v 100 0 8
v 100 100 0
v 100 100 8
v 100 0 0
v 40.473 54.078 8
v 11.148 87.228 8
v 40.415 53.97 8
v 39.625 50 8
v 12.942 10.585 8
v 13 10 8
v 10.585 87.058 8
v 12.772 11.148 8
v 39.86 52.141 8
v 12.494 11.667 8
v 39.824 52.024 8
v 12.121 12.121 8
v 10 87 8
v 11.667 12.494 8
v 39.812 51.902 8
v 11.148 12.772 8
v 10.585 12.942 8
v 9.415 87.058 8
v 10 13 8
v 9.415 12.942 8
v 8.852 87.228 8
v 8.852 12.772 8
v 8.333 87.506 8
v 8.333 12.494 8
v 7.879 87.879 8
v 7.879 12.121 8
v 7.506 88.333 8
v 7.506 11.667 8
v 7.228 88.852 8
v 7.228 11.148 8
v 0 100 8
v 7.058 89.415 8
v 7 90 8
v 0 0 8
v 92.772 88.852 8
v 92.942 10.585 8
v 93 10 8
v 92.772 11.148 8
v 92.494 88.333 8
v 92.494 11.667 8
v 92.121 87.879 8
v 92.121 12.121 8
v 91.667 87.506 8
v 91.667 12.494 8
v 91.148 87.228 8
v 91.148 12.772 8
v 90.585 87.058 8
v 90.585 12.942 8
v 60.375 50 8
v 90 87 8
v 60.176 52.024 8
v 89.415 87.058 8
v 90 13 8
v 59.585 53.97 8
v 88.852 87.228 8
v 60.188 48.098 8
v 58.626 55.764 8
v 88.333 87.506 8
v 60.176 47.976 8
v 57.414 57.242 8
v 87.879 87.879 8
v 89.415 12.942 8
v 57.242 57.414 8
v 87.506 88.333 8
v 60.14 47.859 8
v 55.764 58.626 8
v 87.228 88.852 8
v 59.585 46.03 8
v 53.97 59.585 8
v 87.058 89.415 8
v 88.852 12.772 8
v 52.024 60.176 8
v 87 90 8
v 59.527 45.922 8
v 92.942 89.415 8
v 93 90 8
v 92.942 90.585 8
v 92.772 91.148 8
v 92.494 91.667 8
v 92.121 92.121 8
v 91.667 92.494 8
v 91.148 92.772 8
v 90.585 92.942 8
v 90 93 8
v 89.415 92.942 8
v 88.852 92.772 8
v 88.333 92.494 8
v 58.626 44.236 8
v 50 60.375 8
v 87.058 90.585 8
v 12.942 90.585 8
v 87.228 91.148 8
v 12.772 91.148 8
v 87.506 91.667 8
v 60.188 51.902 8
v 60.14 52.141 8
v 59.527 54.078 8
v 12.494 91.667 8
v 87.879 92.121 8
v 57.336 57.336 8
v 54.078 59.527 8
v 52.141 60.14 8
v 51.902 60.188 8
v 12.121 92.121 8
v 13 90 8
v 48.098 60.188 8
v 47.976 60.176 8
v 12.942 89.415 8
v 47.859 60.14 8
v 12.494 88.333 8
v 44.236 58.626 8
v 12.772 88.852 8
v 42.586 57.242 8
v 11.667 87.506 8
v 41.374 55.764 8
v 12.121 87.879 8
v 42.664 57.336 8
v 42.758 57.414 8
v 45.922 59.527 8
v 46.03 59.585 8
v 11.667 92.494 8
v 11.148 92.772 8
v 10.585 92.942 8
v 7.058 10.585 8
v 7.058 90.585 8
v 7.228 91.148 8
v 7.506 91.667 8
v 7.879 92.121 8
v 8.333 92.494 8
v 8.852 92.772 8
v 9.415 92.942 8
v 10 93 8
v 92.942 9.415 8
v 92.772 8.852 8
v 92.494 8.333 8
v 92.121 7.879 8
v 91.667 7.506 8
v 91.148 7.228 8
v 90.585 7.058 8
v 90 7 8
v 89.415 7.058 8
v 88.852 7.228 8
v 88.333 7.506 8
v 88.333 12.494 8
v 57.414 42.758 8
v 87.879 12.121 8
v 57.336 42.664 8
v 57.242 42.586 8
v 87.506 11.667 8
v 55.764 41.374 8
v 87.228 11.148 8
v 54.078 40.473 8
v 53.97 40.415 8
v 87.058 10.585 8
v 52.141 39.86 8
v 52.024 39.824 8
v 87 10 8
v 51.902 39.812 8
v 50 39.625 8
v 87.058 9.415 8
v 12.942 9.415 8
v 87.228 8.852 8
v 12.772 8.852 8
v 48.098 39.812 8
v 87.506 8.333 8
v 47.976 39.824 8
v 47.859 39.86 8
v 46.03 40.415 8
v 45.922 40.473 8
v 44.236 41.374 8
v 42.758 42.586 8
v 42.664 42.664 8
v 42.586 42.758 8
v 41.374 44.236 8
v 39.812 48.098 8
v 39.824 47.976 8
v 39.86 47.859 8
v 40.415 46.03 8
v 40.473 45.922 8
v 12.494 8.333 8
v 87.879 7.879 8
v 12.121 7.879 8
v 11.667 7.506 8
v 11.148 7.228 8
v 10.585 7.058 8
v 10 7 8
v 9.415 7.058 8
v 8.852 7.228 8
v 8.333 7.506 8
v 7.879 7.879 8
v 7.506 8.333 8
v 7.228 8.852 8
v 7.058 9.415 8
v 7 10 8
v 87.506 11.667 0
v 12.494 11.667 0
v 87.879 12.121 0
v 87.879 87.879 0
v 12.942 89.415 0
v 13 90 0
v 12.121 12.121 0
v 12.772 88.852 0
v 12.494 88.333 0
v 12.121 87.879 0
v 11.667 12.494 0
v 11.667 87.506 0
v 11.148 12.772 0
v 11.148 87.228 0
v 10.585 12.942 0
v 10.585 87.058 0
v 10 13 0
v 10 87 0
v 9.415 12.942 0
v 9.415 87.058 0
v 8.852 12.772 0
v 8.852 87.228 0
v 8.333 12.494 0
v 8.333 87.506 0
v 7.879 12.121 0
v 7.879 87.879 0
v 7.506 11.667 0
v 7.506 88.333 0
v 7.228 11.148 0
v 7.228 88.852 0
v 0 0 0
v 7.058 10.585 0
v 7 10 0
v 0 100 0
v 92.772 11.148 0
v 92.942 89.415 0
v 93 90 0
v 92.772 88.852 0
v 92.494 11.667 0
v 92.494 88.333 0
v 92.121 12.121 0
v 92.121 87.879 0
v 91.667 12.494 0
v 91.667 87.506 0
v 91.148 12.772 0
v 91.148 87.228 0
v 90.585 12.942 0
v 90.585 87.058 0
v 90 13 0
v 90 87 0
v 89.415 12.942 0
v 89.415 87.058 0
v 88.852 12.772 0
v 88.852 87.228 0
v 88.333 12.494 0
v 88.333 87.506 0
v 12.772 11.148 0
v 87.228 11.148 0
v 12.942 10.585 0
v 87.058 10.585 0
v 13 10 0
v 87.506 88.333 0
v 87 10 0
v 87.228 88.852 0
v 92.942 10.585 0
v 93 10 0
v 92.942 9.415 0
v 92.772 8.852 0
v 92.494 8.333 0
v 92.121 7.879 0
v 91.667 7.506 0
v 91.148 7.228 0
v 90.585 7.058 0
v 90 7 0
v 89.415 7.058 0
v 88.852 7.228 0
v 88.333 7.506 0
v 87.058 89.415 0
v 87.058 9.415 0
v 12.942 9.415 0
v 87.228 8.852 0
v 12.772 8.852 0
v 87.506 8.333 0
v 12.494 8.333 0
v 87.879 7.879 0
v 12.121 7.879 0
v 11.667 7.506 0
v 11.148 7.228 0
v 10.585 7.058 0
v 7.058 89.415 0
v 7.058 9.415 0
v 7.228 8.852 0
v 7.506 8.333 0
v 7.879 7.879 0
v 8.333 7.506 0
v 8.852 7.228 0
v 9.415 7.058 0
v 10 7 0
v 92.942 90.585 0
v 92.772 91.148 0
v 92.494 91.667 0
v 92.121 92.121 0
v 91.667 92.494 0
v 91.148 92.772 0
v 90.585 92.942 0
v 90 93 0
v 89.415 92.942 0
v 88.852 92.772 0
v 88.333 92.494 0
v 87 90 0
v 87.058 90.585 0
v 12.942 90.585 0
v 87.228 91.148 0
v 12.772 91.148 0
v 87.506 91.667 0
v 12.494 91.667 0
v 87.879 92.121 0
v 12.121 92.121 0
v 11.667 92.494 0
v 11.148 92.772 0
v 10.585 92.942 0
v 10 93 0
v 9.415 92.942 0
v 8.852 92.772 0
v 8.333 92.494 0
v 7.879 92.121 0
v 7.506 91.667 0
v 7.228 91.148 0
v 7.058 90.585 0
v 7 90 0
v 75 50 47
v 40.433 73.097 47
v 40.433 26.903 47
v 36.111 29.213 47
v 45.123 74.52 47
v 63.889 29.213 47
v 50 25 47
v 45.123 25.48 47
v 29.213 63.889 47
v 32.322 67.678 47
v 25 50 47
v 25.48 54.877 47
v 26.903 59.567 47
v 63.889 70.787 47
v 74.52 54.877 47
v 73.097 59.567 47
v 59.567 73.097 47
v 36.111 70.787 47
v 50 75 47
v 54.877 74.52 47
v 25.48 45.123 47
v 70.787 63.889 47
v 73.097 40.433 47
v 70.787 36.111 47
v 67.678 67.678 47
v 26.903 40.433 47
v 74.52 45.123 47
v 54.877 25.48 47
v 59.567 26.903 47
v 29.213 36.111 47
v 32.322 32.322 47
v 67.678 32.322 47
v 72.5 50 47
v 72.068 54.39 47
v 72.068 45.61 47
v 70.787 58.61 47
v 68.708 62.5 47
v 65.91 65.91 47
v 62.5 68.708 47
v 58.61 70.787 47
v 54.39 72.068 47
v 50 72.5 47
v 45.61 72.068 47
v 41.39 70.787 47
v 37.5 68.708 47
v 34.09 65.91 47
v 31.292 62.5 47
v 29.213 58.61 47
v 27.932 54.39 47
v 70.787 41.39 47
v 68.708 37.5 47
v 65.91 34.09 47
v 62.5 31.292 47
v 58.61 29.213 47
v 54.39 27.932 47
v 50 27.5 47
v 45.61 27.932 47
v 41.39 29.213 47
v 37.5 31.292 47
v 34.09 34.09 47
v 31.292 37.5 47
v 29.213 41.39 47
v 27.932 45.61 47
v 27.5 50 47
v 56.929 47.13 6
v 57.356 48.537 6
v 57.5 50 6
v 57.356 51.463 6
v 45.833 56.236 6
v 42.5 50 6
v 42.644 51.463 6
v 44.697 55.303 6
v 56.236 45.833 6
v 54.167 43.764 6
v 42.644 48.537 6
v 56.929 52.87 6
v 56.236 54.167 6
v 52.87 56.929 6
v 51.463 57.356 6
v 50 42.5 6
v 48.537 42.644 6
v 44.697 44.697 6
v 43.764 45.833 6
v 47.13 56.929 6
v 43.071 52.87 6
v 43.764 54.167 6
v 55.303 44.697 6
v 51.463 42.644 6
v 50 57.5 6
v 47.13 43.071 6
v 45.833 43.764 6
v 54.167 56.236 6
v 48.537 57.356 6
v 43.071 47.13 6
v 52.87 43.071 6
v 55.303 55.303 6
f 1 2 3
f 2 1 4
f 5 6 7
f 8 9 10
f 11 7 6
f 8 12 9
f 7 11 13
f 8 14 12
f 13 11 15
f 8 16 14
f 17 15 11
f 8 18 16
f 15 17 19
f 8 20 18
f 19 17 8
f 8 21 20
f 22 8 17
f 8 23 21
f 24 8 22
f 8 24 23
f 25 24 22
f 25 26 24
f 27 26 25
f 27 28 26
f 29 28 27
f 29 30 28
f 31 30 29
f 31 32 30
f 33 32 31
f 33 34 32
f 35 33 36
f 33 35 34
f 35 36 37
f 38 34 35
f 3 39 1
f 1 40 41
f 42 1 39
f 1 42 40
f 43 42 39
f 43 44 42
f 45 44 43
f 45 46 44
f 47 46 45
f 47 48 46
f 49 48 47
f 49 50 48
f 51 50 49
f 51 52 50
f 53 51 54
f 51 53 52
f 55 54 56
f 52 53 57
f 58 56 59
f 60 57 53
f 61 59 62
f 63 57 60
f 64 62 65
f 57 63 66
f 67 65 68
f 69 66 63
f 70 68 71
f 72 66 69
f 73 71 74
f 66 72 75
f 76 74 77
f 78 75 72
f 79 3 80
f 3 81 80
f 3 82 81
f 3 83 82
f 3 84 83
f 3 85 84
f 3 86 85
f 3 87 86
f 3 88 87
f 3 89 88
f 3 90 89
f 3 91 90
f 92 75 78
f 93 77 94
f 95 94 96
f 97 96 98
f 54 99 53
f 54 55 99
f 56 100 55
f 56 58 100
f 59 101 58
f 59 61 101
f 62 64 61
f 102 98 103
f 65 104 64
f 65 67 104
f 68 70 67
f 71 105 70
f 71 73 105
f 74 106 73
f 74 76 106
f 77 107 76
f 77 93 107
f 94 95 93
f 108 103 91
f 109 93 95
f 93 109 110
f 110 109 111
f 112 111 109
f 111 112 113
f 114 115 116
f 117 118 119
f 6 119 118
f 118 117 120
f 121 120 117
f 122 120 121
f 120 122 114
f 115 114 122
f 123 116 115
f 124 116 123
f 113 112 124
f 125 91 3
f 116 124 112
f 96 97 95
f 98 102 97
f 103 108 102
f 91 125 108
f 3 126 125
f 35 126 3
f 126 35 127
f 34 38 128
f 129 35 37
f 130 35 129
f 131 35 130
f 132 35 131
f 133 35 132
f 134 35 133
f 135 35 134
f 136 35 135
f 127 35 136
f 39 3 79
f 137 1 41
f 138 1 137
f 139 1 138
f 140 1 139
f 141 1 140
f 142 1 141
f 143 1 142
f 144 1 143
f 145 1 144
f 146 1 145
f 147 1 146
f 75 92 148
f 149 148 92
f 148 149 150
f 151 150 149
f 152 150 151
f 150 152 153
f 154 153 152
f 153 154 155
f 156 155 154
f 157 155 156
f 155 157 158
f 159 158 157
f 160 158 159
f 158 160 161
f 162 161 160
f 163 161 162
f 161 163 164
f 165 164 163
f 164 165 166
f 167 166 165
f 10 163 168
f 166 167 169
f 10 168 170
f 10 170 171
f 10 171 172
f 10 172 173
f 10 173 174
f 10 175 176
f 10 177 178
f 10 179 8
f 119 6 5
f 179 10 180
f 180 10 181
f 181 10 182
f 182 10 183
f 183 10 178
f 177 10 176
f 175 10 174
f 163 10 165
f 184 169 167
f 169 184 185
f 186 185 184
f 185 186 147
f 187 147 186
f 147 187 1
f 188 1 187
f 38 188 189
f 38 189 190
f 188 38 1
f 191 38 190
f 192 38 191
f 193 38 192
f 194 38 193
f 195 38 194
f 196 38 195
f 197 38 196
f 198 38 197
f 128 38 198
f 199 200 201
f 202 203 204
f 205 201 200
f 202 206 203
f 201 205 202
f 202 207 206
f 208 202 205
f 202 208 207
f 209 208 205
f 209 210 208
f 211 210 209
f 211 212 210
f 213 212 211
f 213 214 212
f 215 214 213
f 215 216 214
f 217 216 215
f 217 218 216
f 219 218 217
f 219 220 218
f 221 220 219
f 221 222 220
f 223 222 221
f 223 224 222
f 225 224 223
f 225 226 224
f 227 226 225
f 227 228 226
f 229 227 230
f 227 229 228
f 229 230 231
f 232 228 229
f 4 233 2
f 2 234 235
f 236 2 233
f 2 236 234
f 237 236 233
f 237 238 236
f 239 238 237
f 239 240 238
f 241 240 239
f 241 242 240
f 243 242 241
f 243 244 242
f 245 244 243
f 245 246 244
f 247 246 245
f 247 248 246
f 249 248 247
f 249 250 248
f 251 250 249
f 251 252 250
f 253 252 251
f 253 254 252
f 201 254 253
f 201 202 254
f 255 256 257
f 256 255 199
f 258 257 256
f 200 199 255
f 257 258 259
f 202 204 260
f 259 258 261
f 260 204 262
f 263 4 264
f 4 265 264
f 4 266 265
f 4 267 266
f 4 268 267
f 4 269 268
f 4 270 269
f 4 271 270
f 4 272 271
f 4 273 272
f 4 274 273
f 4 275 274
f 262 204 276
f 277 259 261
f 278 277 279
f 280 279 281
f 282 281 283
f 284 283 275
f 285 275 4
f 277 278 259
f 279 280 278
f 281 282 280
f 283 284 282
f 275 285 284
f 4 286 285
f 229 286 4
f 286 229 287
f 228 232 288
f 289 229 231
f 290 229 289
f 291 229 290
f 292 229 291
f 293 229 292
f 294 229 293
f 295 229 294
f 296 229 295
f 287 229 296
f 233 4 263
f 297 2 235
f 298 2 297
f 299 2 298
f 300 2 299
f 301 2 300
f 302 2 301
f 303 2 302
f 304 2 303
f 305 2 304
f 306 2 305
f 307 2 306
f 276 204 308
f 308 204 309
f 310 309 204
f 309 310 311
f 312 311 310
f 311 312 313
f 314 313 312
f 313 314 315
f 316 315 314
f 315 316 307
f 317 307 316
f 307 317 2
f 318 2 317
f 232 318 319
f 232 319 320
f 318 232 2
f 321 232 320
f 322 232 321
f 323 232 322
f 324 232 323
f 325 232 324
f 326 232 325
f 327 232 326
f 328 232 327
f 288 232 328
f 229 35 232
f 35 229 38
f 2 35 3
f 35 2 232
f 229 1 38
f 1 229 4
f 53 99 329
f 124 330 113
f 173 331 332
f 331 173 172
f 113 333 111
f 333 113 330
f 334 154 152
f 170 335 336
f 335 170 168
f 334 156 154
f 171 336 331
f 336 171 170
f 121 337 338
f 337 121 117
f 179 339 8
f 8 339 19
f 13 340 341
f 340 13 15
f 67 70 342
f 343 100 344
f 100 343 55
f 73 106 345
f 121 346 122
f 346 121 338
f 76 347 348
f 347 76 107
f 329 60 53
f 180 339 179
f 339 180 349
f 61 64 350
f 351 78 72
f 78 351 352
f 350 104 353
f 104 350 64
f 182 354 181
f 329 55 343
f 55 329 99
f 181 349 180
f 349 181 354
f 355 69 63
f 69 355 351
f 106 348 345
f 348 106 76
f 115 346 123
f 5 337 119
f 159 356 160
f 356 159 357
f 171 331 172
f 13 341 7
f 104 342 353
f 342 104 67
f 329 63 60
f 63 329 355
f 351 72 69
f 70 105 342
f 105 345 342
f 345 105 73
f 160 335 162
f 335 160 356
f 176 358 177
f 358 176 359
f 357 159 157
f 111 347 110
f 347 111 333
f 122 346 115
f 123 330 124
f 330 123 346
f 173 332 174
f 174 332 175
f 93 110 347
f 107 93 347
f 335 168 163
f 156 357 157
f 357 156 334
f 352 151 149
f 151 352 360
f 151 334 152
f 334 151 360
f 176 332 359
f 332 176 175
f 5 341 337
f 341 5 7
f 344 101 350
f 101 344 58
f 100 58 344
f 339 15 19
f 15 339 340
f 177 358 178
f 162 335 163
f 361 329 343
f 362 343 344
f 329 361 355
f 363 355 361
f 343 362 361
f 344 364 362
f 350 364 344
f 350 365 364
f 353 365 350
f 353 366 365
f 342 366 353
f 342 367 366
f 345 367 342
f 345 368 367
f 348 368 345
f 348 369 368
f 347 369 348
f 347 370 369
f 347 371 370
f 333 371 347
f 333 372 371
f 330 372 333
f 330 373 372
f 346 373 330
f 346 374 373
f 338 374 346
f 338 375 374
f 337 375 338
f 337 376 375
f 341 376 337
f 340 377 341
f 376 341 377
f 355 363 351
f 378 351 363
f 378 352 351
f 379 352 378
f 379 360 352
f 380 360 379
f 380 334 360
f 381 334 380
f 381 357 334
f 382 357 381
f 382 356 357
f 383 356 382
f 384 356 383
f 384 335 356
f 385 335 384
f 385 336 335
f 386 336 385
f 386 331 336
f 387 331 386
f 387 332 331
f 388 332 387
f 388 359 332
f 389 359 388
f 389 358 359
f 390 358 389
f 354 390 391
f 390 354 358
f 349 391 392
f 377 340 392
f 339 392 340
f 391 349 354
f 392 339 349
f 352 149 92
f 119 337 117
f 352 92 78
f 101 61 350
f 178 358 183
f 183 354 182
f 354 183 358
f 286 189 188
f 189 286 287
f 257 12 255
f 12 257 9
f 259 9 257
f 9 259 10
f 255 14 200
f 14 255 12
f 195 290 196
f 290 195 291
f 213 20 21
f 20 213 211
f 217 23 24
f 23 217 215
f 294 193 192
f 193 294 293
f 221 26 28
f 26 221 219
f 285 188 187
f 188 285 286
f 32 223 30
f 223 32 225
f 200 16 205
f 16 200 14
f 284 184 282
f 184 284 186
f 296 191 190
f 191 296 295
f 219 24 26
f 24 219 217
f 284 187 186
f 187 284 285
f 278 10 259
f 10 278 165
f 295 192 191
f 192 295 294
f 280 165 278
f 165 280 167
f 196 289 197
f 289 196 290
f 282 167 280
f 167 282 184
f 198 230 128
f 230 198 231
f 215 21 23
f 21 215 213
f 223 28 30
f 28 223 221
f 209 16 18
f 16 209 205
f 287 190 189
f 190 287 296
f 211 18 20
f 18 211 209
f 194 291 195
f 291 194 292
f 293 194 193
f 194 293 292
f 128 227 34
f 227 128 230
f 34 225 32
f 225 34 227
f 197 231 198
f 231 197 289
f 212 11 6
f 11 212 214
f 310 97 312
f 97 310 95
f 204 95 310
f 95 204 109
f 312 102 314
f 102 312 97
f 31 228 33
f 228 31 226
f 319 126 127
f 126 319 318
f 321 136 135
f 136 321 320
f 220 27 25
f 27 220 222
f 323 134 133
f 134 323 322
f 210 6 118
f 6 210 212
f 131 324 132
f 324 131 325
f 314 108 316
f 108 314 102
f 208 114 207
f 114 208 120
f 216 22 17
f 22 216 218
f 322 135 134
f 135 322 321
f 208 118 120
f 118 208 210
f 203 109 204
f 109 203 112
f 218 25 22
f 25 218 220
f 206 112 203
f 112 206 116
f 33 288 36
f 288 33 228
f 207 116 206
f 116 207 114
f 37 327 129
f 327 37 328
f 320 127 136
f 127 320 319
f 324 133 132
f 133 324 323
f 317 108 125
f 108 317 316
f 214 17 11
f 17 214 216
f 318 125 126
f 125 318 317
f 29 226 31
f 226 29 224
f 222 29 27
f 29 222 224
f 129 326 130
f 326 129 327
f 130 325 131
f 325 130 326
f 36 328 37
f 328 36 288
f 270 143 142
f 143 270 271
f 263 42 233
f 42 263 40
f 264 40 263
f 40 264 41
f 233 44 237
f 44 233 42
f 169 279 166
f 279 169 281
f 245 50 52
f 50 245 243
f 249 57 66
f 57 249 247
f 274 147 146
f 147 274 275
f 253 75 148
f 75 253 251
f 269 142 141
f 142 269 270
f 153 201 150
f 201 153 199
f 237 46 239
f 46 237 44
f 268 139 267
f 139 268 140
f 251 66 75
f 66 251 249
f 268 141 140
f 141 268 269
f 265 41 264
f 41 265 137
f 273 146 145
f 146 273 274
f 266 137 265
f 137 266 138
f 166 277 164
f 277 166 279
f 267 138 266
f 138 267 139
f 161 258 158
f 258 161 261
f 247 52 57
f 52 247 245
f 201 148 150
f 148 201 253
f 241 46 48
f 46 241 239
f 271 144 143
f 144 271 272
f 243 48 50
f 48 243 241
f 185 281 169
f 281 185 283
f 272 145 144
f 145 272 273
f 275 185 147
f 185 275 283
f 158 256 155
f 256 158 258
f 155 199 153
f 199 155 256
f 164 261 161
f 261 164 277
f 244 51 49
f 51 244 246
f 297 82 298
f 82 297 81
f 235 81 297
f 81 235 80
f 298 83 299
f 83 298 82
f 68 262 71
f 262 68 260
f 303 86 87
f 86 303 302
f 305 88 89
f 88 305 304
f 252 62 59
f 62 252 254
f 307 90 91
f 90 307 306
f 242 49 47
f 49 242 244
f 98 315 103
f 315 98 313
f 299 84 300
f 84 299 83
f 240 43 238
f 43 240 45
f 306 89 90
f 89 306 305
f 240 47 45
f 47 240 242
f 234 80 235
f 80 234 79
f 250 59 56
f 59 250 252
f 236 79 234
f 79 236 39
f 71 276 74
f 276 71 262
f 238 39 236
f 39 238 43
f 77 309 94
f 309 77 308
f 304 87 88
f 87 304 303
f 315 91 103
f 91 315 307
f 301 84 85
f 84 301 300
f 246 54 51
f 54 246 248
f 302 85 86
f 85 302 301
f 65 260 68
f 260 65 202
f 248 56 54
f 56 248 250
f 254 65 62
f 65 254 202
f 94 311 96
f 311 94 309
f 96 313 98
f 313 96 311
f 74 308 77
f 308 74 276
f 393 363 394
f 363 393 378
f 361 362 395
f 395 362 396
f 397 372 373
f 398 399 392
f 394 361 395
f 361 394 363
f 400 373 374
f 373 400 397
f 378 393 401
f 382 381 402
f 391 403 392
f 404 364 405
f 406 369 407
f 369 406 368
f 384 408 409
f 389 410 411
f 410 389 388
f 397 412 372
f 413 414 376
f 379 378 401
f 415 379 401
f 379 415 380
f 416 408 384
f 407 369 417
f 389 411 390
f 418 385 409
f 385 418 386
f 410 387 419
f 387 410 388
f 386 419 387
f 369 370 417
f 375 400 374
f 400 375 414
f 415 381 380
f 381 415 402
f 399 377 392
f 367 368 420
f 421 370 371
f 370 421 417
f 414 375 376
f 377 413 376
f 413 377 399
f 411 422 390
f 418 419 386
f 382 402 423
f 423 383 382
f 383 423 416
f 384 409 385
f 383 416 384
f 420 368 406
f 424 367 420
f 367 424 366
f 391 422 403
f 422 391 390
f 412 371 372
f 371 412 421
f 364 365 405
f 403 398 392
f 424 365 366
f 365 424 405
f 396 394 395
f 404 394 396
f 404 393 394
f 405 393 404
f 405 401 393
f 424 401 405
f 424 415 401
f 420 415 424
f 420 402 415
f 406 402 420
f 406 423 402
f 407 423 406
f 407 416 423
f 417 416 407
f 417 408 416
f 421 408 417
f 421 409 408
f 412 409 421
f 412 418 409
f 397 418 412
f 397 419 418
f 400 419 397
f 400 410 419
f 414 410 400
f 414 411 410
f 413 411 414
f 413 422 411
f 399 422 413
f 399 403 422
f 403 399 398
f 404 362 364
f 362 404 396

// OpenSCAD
$fn = 32;

// ----------------------------------------------------------------------
// Hopper: flanged with square flange
// ----------------------------------------------------------------------

// --- parameters (mm) ---
fl = 100;                 // flange side, X and Y
fl_t = 8;                 // flange thickness
cone_h = 40;              // cone height above the flange
top_d = 50;               // cone mouth diameter
bot_d = 20;               // cone spout diameter
wall = 2.5;               // cone wall thickness
hole_r = 3;               // flange hole radius
hole_in = 10;             // hole inset from the corners

bore_d = bot_d - 2 * wall;  // spout bore diameter
total_h = fl_t + cone_h - 1;  // overall height

difference() {
  union() {
    cube([fl, fl, fl_t]);
    translate([fl / 2, fl / 2, fl_t - 1])
      cylinder(h = cone_h, d1 = bot_d, d2 = top_d);
  }
  translate([fl / 2, fl / 2, fl_t - 2])
    cylinder(h = cone_h + 1, d1 = bore_d, d2 = top_d - 2 * wall);
  for (sx = [0, 1], sy = [0, 1])
    translate([sx ? fl - hole_in : hole_in,
               sy ? fl - hole_in : hole_in, -1])
      cylinder(r = hole_r, h = fl_t + 2);
}
